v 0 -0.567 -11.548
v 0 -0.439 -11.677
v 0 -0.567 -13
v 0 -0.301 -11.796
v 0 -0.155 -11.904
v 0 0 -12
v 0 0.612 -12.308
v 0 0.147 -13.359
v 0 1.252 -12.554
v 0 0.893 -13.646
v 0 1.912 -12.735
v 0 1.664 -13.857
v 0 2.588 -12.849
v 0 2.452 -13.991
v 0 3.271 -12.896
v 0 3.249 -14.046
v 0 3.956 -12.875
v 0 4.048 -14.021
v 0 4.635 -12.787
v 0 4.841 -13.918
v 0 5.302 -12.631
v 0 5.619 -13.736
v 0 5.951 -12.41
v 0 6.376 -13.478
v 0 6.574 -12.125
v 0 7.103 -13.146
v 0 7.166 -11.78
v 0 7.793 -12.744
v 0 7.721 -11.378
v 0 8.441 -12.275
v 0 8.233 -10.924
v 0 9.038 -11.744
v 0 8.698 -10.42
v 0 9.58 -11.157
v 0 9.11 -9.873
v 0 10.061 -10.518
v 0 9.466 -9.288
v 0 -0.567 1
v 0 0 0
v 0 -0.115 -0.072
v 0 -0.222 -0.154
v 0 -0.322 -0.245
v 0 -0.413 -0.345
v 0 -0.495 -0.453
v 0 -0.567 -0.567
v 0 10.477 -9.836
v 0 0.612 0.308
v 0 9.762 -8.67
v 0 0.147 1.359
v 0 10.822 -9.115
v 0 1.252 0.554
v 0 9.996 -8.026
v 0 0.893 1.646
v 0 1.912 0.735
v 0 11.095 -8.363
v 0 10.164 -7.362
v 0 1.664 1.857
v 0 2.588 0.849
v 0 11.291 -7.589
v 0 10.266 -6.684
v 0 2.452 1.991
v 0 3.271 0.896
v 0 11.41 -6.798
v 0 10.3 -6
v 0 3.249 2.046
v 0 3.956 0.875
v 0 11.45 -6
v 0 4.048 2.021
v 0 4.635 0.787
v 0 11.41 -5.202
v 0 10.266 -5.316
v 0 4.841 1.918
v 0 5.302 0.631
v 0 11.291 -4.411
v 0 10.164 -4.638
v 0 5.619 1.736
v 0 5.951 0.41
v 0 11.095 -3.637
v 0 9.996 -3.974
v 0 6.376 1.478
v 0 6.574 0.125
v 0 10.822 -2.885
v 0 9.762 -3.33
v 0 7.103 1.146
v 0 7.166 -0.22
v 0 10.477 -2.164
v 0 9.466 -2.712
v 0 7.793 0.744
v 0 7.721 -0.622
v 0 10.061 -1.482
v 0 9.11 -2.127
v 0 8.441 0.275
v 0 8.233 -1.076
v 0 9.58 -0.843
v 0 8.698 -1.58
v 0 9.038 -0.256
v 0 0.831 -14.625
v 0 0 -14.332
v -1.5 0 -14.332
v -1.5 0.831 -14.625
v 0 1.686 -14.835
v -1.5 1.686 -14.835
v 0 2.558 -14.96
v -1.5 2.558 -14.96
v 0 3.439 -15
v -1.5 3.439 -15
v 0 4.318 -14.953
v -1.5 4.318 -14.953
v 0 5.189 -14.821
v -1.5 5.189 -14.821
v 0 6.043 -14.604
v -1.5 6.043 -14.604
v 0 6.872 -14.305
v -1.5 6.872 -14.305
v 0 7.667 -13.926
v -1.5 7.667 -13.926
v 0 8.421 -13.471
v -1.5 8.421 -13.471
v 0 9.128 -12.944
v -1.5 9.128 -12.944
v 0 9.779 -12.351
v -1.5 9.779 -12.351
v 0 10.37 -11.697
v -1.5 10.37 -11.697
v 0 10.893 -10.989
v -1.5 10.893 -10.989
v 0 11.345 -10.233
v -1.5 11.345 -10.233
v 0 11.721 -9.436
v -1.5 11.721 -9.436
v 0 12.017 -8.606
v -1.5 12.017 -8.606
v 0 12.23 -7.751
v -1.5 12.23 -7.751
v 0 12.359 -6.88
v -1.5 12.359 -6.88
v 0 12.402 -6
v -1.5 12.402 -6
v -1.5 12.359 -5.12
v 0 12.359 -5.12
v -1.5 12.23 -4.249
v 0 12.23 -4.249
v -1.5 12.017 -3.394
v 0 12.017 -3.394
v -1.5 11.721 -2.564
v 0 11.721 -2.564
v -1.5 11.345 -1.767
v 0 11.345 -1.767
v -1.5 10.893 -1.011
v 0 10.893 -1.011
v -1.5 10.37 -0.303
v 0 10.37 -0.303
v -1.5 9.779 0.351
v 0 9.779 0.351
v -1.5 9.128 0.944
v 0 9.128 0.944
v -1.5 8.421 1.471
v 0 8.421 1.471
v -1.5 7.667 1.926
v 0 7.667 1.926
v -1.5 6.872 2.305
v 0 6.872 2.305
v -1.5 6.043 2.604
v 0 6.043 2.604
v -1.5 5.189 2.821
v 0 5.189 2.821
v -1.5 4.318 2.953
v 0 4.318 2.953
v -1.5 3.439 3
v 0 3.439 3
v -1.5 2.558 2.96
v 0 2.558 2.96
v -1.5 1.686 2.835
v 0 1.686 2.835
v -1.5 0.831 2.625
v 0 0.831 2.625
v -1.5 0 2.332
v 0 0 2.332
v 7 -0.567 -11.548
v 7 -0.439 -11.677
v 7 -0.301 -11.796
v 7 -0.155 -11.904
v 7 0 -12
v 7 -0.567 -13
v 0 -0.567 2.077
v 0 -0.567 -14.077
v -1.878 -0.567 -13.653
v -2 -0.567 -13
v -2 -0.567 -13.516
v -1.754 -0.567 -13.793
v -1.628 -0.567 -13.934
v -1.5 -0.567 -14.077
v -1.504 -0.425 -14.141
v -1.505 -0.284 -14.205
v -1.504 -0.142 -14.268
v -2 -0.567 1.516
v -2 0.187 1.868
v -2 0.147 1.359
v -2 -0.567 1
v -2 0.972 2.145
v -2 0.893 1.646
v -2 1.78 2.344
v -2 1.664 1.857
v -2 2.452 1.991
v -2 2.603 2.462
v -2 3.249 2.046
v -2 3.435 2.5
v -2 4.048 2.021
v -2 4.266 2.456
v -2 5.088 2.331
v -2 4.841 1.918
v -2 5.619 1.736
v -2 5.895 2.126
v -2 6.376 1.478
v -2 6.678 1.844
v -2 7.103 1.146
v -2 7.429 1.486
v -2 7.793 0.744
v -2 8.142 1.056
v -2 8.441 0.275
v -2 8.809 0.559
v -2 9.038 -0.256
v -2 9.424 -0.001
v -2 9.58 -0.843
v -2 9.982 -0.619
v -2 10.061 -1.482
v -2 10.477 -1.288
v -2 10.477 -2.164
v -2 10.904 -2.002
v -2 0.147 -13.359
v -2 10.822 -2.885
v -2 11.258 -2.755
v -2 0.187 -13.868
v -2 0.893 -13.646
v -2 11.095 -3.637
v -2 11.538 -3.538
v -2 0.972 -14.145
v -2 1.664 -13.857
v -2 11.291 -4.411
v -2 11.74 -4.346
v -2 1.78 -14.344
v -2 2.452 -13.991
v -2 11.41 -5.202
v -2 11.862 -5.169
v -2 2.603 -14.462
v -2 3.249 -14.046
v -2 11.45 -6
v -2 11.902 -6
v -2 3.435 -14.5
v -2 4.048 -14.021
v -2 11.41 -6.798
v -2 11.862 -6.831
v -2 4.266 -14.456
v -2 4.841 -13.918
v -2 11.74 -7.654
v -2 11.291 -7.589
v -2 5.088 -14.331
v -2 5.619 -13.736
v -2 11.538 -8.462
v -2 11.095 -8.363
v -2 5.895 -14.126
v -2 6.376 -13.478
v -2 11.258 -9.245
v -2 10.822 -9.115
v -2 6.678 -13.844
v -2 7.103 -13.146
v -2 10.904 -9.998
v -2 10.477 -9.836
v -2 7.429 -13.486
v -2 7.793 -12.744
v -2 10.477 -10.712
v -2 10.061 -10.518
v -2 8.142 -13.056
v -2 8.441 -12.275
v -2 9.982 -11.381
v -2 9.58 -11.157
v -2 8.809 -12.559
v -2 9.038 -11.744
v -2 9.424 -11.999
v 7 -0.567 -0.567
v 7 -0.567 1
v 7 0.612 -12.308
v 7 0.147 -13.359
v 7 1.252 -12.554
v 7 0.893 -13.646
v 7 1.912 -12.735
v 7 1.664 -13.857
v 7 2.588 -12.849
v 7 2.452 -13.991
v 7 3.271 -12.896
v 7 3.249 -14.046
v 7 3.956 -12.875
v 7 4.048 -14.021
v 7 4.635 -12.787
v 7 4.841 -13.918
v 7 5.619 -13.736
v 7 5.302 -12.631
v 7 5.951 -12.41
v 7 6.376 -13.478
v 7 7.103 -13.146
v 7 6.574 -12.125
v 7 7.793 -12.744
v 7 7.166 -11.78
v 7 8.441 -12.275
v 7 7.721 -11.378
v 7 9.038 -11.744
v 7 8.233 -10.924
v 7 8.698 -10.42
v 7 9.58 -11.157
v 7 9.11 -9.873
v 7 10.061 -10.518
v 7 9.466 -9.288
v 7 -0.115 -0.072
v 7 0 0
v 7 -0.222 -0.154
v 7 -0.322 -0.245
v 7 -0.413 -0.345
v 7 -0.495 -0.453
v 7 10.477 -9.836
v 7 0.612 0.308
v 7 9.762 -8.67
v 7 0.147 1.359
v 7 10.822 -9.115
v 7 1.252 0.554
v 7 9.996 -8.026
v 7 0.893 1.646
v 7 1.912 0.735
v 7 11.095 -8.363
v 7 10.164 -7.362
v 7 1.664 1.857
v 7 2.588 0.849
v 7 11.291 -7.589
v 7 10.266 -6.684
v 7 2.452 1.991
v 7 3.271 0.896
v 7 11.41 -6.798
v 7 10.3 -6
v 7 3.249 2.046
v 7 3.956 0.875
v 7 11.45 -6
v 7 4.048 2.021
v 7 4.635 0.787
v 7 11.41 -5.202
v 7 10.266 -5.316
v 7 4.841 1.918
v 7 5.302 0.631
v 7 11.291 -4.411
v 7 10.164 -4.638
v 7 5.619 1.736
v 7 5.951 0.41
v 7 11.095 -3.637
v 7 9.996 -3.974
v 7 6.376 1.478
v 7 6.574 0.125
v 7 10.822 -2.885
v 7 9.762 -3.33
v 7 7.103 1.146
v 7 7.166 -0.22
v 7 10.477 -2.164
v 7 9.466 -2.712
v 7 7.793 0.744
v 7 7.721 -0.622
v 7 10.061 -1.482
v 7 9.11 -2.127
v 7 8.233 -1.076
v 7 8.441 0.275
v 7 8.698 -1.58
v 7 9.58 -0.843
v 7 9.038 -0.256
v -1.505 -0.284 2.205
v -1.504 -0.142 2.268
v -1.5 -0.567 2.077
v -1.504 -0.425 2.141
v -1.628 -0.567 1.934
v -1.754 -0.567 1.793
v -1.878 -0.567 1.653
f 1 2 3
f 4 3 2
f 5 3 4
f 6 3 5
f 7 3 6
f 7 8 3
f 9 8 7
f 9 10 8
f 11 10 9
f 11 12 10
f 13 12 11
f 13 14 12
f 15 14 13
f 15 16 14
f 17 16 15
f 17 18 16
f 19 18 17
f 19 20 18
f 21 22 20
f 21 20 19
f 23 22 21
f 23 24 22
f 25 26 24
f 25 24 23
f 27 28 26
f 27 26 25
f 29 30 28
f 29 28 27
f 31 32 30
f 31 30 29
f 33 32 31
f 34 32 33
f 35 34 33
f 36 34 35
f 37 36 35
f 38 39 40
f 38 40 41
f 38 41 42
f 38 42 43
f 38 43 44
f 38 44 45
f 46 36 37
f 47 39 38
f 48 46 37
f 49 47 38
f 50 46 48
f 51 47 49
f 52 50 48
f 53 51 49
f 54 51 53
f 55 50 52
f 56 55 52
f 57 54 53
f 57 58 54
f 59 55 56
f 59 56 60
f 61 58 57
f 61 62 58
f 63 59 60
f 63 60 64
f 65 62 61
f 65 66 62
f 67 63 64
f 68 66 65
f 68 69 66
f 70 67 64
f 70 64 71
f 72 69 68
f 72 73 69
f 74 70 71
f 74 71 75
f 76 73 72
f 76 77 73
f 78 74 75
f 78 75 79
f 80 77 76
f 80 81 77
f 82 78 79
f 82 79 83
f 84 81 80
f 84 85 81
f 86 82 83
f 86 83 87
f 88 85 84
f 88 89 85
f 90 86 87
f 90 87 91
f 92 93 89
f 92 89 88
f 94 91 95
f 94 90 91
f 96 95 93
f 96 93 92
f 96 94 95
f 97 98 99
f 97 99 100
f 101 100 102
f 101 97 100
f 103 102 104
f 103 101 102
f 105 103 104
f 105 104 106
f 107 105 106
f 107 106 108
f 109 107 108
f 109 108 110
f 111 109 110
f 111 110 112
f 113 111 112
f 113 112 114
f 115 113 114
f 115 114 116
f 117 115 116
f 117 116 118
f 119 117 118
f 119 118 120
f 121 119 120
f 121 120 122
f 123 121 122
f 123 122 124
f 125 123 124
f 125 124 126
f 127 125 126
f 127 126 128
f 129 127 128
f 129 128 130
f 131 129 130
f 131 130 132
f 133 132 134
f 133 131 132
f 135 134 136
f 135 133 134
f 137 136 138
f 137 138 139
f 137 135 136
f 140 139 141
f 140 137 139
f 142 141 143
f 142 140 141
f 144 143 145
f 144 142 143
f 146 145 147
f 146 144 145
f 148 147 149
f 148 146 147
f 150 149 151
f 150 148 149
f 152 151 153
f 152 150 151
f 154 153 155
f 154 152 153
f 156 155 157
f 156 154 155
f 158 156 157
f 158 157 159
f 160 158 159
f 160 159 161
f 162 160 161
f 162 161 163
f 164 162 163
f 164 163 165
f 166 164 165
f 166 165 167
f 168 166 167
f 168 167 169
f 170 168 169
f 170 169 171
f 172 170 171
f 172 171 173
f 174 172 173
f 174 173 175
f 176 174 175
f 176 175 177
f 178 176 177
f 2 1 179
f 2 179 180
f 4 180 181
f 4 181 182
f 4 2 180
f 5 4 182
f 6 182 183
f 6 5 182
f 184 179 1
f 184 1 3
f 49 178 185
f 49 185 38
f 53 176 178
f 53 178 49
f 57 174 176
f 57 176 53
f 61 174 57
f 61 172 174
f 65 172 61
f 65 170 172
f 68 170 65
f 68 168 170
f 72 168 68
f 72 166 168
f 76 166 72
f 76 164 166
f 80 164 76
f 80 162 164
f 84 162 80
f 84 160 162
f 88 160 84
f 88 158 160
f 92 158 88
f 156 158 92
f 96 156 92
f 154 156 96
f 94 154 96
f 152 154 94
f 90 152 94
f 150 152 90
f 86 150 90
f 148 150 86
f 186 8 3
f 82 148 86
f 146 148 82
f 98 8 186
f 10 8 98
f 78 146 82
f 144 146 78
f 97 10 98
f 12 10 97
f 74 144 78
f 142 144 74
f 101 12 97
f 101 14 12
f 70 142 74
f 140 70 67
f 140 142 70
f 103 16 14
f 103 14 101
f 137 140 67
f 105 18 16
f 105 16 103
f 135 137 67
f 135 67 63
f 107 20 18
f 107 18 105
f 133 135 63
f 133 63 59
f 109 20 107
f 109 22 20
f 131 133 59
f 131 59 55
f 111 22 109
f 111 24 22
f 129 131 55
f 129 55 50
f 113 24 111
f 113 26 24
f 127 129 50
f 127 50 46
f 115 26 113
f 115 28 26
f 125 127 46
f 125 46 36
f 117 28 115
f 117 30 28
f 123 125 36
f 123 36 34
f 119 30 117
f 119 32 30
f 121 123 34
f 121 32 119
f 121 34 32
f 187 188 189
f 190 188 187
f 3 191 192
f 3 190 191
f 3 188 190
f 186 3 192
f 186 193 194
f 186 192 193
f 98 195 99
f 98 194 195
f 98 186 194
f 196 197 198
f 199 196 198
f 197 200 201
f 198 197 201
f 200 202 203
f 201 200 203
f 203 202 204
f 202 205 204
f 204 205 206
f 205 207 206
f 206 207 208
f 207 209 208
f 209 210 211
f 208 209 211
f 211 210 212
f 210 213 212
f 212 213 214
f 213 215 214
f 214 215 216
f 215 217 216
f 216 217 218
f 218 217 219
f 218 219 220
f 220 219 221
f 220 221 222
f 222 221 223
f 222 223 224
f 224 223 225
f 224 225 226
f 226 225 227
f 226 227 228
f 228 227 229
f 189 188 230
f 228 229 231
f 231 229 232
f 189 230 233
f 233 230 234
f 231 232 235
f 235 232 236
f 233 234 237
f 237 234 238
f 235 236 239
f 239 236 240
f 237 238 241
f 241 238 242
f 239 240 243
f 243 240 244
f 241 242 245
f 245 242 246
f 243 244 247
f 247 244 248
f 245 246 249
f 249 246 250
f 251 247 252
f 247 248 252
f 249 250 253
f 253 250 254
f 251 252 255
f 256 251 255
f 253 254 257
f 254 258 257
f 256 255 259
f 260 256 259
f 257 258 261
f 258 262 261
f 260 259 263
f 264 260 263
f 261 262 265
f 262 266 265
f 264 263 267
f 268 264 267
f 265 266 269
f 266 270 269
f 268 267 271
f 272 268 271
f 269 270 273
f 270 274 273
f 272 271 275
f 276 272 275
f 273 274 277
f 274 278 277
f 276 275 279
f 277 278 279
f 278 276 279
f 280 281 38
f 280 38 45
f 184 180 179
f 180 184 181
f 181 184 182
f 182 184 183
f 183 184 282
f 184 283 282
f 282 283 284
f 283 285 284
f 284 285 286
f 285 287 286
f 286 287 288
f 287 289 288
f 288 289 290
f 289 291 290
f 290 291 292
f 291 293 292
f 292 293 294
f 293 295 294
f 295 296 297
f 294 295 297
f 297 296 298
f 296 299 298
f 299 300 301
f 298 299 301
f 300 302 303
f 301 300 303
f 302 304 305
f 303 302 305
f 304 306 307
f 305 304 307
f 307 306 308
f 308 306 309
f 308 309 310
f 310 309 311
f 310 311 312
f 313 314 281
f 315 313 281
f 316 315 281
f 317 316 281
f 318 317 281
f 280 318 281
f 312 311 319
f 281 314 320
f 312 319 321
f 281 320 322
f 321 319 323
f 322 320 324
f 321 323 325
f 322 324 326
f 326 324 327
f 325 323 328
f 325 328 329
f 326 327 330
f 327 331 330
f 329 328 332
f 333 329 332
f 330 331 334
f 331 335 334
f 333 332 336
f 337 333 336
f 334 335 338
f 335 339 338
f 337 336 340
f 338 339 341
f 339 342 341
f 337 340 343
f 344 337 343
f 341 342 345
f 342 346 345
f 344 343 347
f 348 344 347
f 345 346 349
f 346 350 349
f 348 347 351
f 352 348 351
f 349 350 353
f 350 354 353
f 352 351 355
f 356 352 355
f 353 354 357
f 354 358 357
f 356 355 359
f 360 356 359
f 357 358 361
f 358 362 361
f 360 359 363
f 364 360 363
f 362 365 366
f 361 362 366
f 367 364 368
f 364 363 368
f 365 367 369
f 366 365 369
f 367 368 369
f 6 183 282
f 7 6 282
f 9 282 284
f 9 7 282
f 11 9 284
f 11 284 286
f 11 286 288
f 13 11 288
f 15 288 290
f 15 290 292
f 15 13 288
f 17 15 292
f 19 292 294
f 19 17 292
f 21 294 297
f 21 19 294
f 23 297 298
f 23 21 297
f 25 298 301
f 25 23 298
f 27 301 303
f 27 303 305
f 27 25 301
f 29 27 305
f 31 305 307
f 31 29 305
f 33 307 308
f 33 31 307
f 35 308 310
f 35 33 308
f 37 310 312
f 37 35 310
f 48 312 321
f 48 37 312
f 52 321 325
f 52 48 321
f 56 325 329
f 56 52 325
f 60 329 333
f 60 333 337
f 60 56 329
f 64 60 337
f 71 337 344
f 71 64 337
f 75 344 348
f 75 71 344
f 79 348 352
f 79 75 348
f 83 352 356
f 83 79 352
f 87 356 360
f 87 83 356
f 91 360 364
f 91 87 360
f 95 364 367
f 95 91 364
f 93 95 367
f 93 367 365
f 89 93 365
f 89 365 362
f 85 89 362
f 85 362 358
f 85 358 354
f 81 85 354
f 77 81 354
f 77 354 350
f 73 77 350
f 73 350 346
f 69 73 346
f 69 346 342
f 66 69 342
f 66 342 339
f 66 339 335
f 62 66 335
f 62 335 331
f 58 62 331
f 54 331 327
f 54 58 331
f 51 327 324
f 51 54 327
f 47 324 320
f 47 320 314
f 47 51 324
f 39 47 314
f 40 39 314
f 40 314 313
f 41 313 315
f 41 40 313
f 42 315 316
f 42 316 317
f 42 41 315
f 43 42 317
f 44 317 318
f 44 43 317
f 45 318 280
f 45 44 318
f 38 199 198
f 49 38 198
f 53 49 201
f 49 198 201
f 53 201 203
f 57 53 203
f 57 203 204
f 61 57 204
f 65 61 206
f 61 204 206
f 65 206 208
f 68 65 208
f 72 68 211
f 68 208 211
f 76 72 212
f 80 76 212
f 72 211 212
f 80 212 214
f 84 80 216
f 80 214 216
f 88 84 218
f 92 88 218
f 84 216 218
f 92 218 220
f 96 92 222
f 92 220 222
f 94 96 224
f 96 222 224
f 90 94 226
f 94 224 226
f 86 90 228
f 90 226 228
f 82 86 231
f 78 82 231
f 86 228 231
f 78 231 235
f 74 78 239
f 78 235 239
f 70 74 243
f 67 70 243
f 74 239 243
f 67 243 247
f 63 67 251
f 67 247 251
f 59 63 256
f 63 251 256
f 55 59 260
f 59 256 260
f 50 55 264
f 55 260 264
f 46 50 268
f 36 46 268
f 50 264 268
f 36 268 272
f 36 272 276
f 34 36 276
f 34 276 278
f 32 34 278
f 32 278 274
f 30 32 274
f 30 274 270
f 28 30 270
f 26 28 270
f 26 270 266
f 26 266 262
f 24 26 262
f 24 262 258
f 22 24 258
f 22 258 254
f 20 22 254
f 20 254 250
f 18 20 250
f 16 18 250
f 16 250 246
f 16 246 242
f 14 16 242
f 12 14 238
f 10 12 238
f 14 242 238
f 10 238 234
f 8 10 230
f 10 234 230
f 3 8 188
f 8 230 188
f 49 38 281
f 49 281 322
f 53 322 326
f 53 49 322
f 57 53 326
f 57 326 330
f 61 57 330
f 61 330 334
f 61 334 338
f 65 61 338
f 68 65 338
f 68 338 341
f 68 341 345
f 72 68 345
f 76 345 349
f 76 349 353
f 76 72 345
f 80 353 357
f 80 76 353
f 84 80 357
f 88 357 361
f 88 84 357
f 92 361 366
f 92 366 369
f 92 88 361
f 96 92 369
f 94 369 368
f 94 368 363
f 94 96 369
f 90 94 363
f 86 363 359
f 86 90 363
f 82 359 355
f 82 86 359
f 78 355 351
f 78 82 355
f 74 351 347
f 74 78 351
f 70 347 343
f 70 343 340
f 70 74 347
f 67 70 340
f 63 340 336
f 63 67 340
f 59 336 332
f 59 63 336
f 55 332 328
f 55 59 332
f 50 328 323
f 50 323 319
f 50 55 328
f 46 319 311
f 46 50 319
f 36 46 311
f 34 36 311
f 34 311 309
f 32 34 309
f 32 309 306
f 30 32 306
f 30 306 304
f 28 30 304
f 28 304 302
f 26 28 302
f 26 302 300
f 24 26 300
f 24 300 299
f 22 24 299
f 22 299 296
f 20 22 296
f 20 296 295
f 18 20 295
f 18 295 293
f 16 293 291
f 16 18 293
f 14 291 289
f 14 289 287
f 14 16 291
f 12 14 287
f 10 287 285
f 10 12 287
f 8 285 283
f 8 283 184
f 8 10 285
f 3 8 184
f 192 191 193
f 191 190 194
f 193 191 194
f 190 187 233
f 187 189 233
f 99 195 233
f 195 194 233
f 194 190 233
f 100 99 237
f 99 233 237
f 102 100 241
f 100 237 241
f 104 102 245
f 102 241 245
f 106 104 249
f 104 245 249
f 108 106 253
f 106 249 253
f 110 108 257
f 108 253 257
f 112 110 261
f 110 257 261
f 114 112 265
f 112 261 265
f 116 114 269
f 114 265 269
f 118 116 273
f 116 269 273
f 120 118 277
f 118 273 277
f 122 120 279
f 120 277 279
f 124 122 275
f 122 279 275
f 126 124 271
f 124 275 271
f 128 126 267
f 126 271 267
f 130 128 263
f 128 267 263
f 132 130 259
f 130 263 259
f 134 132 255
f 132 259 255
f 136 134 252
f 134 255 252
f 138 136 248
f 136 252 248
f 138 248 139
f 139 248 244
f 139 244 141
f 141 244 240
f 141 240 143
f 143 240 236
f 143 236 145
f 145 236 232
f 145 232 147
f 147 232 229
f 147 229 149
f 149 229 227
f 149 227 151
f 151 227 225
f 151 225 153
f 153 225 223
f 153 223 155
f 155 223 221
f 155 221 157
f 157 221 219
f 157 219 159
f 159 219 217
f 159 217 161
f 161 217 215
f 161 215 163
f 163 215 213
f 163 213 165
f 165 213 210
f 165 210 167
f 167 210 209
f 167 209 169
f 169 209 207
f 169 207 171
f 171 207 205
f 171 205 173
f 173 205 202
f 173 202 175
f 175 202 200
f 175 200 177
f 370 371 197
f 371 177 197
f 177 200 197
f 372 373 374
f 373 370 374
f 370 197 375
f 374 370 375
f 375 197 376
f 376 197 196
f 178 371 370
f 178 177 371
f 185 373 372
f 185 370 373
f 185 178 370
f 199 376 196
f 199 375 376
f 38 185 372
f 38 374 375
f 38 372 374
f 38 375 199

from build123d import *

# Parameters (mm, degrees)
BOSS_EXTRUDE1_DEPTH = 7
BOSS_EXTRUDE3_DEPTH = 2
CUT_EXTRUDE1_START  = -2
CUT_EXTRUDE1_DEPTH  = 2
CHAMFER1_SIZE       = 0.5


with BuildPart() as part:
    # Sketch1 → Boss-Extrude1 (new body)
    with BuildSketch(Plane(origin=(0, 0, 0), x_dir=(0, 0, -1), z_dir=(1, 0, 0))):
        with BuildLine():
            Line((0.567071197, -0.567071197), (-1, -0.567071197))
            ThreePointArc((-1, -0.567071197), (6, 11.449595469), (13, -0.567071197))
            Line((13, -0.567071197), (11.547641445, -0.567071197))
            ThreePointArc((11.547641445, -0.567071197), (11.796193723, -0.301382773), (12, 0))
            ThreePointArc((12, 0), (6, 10.3), (0, 0))
            ThreePointArc((0, 0), (0.245090031, -0.321981166), (0.567071197, -0.567071197))
        make_face()
    extrude(amount=BOSS_EXTRUDE1_DEPTH)

    # Sketch6 → Boss-Extrude3 (add)
    with BuildSketch(Plane(origin=(0, 0, 0), x_dir=(0, 0, -1), z_dir=(1, 0, 0))):
        with BuildLine():
            Line((-2.332075927, 0), (-2.077319023, -0.567071197))
            Line((-2.077319023, -0.567071197), (-1, -0.567071197))
            Line((-1, -0.567071197), (13, -0.567071197))
            Line((13, -0.567071197), (14.077319023, -0.567071197))
            Line((14.077319023, -0.567071197), (14.332075927, 0))
            ThreePointArc((14.332075927, 0), (6, 12.402427184), (-2.332075927, 0))
        make_face()
    extrude(amount=-BOSS_EXTRUDE3_DEPTH)

    # Sketch1<31> → Cut-Extrude1 (cut)
    with BuildSketch(Plane(origin=(0, 0, 0), x_dir=(0, 0, -1), z_dir=(1, 0, 0)).offset(CUT_EXTRUDE1_START)):
        with BuildLine():
            Line((0.567071197, -0.567071197), (-1, -0.567071197))
            ThreePointArc((-1, -0.567071197), (6, 11.449595469), (13, -0.567071197))
            Line((13, -0.567071197), (11.547641445, -0.567071197))
            ThreePointArc((11.547641445, -0.567071197), (11.796193723, -0.301382773), (12, 0))
            ThreePointArc((12, 0), (6, 10.3), (0, 0))
            ThreePointArc((0, 0), (0.245090031, -0.321981166), (0.567071197, -0.567071197))
        make_face()
    extrude(amount=CUT_EXTRUDE1_DEPTH, mode=Mode.SUBTRACT)


with BuildPart() as cut_extrude1_piece_1:
    # of the separate pieces the step leaves, piece 1, a body of its own (cut_extrude1_pieces_kept)
    add(part.part.solids().sort_by_distance((7, -0.567071197, 1))[0])


with BuildPart() as cut_extrude1_piece_2:
    # of the separate pieces the step leaves, piece 2, a body of its own (cut_extrude1_pieces_kept)
    add(part.part.solids().sort_by_distance((0, 0, 2.332075927))[0])

    # Chamfer1
    # the kernel refuses this chamfer: 0.5 mm, written as the material it takes off along each edge
    with BuildSketch(Plane(origin=(-2, 3.402427184, -6), x_dir=(0, -0.5063226027269031, -0.8623441435806557), z_dir=(0, -0.8623441435806557, 0.5063226027269031))) as chamfer1_piece_1:
        Polygon((9, CHAMFER1_SIZE), (9 - CHAMFER1_SIZE, 0), (9, 0), align=None)
    revolve(axis=Axis((-2, 3.402427184, -6), (1, 0, 0)), revolution_arc=240.838378196, mode=Mode.SUBTRACT)


solid = Compound([cut_extrude1_piece_1.part, cut_extrude1_piece_2.part])
